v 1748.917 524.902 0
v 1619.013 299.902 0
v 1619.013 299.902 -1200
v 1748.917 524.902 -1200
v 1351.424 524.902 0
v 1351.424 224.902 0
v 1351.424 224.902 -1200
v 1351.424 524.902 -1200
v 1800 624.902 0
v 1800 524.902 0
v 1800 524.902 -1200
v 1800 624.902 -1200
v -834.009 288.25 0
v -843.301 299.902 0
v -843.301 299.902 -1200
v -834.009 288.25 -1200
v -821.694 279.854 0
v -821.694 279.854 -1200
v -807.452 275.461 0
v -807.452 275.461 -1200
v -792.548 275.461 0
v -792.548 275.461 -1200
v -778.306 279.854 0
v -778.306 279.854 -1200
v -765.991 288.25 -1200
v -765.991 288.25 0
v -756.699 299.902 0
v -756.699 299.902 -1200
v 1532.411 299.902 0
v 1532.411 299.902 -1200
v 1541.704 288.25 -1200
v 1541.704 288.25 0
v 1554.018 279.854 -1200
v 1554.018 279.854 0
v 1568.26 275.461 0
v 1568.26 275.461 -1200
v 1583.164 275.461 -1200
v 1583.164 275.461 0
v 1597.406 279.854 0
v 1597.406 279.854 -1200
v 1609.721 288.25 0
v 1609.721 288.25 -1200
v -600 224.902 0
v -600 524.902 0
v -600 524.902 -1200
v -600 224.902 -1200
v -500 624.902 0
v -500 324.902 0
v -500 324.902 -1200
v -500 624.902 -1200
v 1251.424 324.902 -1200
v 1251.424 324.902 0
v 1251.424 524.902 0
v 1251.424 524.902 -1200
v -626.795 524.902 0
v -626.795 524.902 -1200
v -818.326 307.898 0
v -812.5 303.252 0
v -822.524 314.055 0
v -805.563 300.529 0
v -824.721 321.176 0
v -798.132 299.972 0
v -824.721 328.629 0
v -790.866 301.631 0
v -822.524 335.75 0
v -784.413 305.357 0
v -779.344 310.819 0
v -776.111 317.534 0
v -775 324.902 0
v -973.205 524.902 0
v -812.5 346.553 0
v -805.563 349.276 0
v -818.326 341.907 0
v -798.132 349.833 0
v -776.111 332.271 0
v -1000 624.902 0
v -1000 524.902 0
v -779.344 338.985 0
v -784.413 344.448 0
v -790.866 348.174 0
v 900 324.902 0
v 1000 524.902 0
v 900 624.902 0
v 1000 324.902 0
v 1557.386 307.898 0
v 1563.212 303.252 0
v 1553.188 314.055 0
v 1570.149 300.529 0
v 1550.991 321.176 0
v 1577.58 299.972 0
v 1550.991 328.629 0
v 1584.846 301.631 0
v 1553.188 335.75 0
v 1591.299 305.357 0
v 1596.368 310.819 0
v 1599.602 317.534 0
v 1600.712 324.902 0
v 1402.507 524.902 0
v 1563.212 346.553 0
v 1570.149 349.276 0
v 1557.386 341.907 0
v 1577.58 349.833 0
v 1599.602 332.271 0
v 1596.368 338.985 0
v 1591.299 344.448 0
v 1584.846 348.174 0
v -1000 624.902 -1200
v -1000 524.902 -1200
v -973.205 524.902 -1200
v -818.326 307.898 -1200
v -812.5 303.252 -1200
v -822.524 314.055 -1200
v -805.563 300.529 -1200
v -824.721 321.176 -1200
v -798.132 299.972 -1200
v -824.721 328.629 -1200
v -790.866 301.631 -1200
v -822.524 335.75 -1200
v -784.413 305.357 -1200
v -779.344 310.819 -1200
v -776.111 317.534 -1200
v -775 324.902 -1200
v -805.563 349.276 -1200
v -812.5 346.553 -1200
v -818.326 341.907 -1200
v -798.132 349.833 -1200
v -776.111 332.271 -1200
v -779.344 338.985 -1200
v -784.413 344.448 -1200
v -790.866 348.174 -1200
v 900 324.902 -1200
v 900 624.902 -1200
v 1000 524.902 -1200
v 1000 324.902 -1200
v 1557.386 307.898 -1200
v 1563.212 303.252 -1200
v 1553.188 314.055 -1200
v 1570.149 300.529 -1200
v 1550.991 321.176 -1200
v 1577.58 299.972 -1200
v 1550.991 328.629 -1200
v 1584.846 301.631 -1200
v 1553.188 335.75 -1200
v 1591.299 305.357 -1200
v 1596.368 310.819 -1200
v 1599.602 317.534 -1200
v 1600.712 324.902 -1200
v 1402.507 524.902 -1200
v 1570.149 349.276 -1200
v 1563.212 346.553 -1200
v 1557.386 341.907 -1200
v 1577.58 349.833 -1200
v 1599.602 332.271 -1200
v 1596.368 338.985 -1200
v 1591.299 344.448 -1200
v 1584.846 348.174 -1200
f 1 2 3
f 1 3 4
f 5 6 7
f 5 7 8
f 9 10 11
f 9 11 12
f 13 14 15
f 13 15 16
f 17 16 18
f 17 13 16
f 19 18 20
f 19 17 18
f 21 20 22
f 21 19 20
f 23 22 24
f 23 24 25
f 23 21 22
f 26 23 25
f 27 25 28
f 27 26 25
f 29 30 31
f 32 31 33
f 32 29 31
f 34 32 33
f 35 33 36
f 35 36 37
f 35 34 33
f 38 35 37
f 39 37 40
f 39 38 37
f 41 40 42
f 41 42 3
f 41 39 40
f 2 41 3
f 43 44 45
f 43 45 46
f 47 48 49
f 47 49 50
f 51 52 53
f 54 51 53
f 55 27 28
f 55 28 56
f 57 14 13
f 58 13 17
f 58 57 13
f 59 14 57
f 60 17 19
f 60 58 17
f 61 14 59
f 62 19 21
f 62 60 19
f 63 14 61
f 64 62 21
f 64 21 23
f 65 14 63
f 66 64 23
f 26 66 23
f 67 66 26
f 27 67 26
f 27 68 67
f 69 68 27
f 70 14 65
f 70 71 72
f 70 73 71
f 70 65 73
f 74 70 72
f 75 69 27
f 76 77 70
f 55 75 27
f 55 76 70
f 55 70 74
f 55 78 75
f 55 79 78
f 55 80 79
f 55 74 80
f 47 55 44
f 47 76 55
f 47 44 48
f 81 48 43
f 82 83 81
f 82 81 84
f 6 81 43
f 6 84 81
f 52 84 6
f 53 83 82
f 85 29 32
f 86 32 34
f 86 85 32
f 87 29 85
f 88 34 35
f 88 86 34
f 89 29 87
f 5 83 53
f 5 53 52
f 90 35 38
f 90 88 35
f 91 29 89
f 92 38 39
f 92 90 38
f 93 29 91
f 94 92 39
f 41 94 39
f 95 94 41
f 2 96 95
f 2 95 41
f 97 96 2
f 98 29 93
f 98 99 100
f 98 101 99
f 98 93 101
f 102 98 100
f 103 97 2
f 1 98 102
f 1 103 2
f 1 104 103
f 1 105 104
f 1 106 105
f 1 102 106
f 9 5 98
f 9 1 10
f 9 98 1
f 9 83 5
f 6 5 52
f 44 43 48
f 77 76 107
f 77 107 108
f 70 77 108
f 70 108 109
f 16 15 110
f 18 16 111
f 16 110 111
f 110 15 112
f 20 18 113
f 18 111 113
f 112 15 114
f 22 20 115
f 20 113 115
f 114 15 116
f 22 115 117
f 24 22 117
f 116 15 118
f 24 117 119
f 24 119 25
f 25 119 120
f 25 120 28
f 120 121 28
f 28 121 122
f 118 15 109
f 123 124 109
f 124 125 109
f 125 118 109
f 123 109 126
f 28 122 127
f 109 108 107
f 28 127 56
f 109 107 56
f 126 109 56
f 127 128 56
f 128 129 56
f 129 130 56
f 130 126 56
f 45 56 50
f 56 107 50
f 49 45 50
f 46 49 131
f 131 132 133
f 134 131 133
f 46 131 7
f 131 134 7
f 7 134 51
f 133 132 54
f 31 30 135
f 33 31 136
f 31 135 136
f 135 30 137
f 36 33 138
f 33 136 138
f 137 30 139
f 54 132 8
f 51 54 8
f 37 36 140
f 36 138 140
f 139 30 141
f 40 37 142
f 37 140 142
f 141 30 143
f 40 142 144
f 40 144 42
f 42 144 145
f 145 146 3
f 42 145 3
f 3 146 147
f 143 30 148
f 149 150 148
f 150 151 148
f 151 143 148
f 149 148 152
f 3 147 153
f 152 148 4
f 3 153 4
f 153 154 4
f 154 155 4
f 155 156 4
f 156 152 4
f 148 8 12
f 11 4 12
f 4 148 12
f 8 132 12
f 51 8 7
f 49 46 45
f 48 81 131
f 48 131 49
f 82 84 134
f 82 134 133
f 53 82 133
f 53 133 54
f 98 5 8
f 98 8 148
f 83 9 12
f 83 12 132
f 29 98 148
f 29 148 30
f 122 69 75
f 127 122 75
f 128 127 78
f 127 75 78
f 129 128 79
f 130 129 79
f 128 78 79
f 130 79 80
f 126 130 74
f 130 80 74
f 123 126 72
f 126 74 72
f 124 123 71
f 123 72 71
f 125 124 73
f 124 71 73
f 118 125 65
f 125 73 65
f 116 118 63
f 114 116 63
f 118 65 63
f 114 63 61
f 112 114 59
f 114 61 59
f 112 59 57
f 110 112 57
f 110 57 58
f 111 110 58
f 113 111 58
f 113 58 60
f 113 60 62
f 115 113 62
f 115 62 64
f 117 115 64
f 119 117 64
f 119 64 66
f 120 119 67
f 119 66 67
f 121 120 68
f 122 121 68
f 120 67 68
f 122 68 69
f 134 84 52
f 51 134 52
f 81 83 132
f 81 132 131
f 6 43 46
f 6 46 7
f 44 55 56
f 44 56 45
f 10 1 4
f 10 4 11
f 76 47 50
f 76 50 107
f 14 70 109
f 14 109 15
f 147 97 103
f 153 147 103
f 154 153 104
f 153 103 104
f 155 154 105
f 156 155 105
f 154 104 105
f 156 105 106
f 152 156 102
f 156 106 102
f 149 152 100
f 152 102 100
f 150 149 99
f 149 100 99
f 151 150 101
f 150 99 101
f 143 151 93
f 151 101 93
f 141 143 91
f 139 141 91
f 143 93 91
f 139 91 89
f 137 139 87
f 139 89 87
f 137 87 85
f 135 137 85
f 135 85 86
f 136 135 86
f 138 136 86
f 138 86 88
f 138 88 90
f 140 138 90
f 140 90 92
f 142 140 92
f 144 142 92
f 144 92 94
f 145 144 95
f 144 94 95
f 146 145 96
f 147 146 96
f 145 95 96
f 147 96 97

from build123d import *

# Parameters (mm, degrees)
SKETCH4_R           = 25
SKETCH4_W           = 251.424361175
SKETCH4_H           = 200
BOSS_EXTRUDE3_DEPTH = 1200


with BuildPart() as part:
    # Sketch4 → Boss-Extrude3 (new body)
    with BuildSketch(Plane.XY):
        with BuildLine():
            Line((-600, 224.902446896), (1200, 224.902446896))
            Line((1200, 224.902446896), (1351.424361175, 224.902446896))
            Line((1351.424361175, 224.902446896), (1351.424361175, 524.902446896))
            Line((1351.424361175, 524.902446896), (1402.507099831, 524.902446896))
            Line((1402.507099831, 524.902446896), (1532.410910398, 299.902446896))
            ThreePointArc((1532.410910398, 299.902446896), (1575.712180588, 274.902446896), (1619.013450777, 299.902446896))
            Line((1619.013450777, 299.902446896), (1748.917261345, 524.902446896))
            Line((1748.917261345, 524.902446896), (1800, 524.902446896))
            Line((1800, 524.902446896), (1800, 624.902446896))
            Line((1800, 624.902446896), (900, 624.902446896))
            Line((900, 624.902446896), (900, 324.902446896))
            Line((900, 324.902446896), (-500, 324.902446896))
            Line((-500, 324.902446896), (-500, 624.902446896))
            Line((-500, 624.902446896), (-1000, 624.902446896))
            Line((-1000, 624.902446896), (-1000, 524.902446896))
            Line((-1000, 524.902446896), (-973.205080757, 524.902446896))
            Line((-973.205080757, 524.902446896), (-843.301270189, 299.902446896))
            ThreePointArc((-843.301270189, 299.902446896), (-800, 274.902446896), (-756.698729811, 299.902446896))
            Line((-756.698729811, 299.902446896), (-626.794919243, 524.902446896))
            Line((-626.794919243, 524.902446896), (-600, 524.902446896))
            Line((-600, 524.902446896), (-600, 224.902446896))
        make_face()
        with Locations((-800, 324.902446896)):
            Circle(SKETCH4_R, mode=Mode.SUBTRACT)
        with Locations((1575.712180588, 324.902446896)):
            Circle(SKETCH4_R, mode=Mode.SUBTRACT)
        with Locations((1125.712180588, 424.902446896)):
            Rectangle(SKETCH4_W, SKETCH4_H, mode=Mode.SUBTRACT)
    extrude(amount=-BOSS_EXTRUDE3_DEPTH)


solid = part.part
